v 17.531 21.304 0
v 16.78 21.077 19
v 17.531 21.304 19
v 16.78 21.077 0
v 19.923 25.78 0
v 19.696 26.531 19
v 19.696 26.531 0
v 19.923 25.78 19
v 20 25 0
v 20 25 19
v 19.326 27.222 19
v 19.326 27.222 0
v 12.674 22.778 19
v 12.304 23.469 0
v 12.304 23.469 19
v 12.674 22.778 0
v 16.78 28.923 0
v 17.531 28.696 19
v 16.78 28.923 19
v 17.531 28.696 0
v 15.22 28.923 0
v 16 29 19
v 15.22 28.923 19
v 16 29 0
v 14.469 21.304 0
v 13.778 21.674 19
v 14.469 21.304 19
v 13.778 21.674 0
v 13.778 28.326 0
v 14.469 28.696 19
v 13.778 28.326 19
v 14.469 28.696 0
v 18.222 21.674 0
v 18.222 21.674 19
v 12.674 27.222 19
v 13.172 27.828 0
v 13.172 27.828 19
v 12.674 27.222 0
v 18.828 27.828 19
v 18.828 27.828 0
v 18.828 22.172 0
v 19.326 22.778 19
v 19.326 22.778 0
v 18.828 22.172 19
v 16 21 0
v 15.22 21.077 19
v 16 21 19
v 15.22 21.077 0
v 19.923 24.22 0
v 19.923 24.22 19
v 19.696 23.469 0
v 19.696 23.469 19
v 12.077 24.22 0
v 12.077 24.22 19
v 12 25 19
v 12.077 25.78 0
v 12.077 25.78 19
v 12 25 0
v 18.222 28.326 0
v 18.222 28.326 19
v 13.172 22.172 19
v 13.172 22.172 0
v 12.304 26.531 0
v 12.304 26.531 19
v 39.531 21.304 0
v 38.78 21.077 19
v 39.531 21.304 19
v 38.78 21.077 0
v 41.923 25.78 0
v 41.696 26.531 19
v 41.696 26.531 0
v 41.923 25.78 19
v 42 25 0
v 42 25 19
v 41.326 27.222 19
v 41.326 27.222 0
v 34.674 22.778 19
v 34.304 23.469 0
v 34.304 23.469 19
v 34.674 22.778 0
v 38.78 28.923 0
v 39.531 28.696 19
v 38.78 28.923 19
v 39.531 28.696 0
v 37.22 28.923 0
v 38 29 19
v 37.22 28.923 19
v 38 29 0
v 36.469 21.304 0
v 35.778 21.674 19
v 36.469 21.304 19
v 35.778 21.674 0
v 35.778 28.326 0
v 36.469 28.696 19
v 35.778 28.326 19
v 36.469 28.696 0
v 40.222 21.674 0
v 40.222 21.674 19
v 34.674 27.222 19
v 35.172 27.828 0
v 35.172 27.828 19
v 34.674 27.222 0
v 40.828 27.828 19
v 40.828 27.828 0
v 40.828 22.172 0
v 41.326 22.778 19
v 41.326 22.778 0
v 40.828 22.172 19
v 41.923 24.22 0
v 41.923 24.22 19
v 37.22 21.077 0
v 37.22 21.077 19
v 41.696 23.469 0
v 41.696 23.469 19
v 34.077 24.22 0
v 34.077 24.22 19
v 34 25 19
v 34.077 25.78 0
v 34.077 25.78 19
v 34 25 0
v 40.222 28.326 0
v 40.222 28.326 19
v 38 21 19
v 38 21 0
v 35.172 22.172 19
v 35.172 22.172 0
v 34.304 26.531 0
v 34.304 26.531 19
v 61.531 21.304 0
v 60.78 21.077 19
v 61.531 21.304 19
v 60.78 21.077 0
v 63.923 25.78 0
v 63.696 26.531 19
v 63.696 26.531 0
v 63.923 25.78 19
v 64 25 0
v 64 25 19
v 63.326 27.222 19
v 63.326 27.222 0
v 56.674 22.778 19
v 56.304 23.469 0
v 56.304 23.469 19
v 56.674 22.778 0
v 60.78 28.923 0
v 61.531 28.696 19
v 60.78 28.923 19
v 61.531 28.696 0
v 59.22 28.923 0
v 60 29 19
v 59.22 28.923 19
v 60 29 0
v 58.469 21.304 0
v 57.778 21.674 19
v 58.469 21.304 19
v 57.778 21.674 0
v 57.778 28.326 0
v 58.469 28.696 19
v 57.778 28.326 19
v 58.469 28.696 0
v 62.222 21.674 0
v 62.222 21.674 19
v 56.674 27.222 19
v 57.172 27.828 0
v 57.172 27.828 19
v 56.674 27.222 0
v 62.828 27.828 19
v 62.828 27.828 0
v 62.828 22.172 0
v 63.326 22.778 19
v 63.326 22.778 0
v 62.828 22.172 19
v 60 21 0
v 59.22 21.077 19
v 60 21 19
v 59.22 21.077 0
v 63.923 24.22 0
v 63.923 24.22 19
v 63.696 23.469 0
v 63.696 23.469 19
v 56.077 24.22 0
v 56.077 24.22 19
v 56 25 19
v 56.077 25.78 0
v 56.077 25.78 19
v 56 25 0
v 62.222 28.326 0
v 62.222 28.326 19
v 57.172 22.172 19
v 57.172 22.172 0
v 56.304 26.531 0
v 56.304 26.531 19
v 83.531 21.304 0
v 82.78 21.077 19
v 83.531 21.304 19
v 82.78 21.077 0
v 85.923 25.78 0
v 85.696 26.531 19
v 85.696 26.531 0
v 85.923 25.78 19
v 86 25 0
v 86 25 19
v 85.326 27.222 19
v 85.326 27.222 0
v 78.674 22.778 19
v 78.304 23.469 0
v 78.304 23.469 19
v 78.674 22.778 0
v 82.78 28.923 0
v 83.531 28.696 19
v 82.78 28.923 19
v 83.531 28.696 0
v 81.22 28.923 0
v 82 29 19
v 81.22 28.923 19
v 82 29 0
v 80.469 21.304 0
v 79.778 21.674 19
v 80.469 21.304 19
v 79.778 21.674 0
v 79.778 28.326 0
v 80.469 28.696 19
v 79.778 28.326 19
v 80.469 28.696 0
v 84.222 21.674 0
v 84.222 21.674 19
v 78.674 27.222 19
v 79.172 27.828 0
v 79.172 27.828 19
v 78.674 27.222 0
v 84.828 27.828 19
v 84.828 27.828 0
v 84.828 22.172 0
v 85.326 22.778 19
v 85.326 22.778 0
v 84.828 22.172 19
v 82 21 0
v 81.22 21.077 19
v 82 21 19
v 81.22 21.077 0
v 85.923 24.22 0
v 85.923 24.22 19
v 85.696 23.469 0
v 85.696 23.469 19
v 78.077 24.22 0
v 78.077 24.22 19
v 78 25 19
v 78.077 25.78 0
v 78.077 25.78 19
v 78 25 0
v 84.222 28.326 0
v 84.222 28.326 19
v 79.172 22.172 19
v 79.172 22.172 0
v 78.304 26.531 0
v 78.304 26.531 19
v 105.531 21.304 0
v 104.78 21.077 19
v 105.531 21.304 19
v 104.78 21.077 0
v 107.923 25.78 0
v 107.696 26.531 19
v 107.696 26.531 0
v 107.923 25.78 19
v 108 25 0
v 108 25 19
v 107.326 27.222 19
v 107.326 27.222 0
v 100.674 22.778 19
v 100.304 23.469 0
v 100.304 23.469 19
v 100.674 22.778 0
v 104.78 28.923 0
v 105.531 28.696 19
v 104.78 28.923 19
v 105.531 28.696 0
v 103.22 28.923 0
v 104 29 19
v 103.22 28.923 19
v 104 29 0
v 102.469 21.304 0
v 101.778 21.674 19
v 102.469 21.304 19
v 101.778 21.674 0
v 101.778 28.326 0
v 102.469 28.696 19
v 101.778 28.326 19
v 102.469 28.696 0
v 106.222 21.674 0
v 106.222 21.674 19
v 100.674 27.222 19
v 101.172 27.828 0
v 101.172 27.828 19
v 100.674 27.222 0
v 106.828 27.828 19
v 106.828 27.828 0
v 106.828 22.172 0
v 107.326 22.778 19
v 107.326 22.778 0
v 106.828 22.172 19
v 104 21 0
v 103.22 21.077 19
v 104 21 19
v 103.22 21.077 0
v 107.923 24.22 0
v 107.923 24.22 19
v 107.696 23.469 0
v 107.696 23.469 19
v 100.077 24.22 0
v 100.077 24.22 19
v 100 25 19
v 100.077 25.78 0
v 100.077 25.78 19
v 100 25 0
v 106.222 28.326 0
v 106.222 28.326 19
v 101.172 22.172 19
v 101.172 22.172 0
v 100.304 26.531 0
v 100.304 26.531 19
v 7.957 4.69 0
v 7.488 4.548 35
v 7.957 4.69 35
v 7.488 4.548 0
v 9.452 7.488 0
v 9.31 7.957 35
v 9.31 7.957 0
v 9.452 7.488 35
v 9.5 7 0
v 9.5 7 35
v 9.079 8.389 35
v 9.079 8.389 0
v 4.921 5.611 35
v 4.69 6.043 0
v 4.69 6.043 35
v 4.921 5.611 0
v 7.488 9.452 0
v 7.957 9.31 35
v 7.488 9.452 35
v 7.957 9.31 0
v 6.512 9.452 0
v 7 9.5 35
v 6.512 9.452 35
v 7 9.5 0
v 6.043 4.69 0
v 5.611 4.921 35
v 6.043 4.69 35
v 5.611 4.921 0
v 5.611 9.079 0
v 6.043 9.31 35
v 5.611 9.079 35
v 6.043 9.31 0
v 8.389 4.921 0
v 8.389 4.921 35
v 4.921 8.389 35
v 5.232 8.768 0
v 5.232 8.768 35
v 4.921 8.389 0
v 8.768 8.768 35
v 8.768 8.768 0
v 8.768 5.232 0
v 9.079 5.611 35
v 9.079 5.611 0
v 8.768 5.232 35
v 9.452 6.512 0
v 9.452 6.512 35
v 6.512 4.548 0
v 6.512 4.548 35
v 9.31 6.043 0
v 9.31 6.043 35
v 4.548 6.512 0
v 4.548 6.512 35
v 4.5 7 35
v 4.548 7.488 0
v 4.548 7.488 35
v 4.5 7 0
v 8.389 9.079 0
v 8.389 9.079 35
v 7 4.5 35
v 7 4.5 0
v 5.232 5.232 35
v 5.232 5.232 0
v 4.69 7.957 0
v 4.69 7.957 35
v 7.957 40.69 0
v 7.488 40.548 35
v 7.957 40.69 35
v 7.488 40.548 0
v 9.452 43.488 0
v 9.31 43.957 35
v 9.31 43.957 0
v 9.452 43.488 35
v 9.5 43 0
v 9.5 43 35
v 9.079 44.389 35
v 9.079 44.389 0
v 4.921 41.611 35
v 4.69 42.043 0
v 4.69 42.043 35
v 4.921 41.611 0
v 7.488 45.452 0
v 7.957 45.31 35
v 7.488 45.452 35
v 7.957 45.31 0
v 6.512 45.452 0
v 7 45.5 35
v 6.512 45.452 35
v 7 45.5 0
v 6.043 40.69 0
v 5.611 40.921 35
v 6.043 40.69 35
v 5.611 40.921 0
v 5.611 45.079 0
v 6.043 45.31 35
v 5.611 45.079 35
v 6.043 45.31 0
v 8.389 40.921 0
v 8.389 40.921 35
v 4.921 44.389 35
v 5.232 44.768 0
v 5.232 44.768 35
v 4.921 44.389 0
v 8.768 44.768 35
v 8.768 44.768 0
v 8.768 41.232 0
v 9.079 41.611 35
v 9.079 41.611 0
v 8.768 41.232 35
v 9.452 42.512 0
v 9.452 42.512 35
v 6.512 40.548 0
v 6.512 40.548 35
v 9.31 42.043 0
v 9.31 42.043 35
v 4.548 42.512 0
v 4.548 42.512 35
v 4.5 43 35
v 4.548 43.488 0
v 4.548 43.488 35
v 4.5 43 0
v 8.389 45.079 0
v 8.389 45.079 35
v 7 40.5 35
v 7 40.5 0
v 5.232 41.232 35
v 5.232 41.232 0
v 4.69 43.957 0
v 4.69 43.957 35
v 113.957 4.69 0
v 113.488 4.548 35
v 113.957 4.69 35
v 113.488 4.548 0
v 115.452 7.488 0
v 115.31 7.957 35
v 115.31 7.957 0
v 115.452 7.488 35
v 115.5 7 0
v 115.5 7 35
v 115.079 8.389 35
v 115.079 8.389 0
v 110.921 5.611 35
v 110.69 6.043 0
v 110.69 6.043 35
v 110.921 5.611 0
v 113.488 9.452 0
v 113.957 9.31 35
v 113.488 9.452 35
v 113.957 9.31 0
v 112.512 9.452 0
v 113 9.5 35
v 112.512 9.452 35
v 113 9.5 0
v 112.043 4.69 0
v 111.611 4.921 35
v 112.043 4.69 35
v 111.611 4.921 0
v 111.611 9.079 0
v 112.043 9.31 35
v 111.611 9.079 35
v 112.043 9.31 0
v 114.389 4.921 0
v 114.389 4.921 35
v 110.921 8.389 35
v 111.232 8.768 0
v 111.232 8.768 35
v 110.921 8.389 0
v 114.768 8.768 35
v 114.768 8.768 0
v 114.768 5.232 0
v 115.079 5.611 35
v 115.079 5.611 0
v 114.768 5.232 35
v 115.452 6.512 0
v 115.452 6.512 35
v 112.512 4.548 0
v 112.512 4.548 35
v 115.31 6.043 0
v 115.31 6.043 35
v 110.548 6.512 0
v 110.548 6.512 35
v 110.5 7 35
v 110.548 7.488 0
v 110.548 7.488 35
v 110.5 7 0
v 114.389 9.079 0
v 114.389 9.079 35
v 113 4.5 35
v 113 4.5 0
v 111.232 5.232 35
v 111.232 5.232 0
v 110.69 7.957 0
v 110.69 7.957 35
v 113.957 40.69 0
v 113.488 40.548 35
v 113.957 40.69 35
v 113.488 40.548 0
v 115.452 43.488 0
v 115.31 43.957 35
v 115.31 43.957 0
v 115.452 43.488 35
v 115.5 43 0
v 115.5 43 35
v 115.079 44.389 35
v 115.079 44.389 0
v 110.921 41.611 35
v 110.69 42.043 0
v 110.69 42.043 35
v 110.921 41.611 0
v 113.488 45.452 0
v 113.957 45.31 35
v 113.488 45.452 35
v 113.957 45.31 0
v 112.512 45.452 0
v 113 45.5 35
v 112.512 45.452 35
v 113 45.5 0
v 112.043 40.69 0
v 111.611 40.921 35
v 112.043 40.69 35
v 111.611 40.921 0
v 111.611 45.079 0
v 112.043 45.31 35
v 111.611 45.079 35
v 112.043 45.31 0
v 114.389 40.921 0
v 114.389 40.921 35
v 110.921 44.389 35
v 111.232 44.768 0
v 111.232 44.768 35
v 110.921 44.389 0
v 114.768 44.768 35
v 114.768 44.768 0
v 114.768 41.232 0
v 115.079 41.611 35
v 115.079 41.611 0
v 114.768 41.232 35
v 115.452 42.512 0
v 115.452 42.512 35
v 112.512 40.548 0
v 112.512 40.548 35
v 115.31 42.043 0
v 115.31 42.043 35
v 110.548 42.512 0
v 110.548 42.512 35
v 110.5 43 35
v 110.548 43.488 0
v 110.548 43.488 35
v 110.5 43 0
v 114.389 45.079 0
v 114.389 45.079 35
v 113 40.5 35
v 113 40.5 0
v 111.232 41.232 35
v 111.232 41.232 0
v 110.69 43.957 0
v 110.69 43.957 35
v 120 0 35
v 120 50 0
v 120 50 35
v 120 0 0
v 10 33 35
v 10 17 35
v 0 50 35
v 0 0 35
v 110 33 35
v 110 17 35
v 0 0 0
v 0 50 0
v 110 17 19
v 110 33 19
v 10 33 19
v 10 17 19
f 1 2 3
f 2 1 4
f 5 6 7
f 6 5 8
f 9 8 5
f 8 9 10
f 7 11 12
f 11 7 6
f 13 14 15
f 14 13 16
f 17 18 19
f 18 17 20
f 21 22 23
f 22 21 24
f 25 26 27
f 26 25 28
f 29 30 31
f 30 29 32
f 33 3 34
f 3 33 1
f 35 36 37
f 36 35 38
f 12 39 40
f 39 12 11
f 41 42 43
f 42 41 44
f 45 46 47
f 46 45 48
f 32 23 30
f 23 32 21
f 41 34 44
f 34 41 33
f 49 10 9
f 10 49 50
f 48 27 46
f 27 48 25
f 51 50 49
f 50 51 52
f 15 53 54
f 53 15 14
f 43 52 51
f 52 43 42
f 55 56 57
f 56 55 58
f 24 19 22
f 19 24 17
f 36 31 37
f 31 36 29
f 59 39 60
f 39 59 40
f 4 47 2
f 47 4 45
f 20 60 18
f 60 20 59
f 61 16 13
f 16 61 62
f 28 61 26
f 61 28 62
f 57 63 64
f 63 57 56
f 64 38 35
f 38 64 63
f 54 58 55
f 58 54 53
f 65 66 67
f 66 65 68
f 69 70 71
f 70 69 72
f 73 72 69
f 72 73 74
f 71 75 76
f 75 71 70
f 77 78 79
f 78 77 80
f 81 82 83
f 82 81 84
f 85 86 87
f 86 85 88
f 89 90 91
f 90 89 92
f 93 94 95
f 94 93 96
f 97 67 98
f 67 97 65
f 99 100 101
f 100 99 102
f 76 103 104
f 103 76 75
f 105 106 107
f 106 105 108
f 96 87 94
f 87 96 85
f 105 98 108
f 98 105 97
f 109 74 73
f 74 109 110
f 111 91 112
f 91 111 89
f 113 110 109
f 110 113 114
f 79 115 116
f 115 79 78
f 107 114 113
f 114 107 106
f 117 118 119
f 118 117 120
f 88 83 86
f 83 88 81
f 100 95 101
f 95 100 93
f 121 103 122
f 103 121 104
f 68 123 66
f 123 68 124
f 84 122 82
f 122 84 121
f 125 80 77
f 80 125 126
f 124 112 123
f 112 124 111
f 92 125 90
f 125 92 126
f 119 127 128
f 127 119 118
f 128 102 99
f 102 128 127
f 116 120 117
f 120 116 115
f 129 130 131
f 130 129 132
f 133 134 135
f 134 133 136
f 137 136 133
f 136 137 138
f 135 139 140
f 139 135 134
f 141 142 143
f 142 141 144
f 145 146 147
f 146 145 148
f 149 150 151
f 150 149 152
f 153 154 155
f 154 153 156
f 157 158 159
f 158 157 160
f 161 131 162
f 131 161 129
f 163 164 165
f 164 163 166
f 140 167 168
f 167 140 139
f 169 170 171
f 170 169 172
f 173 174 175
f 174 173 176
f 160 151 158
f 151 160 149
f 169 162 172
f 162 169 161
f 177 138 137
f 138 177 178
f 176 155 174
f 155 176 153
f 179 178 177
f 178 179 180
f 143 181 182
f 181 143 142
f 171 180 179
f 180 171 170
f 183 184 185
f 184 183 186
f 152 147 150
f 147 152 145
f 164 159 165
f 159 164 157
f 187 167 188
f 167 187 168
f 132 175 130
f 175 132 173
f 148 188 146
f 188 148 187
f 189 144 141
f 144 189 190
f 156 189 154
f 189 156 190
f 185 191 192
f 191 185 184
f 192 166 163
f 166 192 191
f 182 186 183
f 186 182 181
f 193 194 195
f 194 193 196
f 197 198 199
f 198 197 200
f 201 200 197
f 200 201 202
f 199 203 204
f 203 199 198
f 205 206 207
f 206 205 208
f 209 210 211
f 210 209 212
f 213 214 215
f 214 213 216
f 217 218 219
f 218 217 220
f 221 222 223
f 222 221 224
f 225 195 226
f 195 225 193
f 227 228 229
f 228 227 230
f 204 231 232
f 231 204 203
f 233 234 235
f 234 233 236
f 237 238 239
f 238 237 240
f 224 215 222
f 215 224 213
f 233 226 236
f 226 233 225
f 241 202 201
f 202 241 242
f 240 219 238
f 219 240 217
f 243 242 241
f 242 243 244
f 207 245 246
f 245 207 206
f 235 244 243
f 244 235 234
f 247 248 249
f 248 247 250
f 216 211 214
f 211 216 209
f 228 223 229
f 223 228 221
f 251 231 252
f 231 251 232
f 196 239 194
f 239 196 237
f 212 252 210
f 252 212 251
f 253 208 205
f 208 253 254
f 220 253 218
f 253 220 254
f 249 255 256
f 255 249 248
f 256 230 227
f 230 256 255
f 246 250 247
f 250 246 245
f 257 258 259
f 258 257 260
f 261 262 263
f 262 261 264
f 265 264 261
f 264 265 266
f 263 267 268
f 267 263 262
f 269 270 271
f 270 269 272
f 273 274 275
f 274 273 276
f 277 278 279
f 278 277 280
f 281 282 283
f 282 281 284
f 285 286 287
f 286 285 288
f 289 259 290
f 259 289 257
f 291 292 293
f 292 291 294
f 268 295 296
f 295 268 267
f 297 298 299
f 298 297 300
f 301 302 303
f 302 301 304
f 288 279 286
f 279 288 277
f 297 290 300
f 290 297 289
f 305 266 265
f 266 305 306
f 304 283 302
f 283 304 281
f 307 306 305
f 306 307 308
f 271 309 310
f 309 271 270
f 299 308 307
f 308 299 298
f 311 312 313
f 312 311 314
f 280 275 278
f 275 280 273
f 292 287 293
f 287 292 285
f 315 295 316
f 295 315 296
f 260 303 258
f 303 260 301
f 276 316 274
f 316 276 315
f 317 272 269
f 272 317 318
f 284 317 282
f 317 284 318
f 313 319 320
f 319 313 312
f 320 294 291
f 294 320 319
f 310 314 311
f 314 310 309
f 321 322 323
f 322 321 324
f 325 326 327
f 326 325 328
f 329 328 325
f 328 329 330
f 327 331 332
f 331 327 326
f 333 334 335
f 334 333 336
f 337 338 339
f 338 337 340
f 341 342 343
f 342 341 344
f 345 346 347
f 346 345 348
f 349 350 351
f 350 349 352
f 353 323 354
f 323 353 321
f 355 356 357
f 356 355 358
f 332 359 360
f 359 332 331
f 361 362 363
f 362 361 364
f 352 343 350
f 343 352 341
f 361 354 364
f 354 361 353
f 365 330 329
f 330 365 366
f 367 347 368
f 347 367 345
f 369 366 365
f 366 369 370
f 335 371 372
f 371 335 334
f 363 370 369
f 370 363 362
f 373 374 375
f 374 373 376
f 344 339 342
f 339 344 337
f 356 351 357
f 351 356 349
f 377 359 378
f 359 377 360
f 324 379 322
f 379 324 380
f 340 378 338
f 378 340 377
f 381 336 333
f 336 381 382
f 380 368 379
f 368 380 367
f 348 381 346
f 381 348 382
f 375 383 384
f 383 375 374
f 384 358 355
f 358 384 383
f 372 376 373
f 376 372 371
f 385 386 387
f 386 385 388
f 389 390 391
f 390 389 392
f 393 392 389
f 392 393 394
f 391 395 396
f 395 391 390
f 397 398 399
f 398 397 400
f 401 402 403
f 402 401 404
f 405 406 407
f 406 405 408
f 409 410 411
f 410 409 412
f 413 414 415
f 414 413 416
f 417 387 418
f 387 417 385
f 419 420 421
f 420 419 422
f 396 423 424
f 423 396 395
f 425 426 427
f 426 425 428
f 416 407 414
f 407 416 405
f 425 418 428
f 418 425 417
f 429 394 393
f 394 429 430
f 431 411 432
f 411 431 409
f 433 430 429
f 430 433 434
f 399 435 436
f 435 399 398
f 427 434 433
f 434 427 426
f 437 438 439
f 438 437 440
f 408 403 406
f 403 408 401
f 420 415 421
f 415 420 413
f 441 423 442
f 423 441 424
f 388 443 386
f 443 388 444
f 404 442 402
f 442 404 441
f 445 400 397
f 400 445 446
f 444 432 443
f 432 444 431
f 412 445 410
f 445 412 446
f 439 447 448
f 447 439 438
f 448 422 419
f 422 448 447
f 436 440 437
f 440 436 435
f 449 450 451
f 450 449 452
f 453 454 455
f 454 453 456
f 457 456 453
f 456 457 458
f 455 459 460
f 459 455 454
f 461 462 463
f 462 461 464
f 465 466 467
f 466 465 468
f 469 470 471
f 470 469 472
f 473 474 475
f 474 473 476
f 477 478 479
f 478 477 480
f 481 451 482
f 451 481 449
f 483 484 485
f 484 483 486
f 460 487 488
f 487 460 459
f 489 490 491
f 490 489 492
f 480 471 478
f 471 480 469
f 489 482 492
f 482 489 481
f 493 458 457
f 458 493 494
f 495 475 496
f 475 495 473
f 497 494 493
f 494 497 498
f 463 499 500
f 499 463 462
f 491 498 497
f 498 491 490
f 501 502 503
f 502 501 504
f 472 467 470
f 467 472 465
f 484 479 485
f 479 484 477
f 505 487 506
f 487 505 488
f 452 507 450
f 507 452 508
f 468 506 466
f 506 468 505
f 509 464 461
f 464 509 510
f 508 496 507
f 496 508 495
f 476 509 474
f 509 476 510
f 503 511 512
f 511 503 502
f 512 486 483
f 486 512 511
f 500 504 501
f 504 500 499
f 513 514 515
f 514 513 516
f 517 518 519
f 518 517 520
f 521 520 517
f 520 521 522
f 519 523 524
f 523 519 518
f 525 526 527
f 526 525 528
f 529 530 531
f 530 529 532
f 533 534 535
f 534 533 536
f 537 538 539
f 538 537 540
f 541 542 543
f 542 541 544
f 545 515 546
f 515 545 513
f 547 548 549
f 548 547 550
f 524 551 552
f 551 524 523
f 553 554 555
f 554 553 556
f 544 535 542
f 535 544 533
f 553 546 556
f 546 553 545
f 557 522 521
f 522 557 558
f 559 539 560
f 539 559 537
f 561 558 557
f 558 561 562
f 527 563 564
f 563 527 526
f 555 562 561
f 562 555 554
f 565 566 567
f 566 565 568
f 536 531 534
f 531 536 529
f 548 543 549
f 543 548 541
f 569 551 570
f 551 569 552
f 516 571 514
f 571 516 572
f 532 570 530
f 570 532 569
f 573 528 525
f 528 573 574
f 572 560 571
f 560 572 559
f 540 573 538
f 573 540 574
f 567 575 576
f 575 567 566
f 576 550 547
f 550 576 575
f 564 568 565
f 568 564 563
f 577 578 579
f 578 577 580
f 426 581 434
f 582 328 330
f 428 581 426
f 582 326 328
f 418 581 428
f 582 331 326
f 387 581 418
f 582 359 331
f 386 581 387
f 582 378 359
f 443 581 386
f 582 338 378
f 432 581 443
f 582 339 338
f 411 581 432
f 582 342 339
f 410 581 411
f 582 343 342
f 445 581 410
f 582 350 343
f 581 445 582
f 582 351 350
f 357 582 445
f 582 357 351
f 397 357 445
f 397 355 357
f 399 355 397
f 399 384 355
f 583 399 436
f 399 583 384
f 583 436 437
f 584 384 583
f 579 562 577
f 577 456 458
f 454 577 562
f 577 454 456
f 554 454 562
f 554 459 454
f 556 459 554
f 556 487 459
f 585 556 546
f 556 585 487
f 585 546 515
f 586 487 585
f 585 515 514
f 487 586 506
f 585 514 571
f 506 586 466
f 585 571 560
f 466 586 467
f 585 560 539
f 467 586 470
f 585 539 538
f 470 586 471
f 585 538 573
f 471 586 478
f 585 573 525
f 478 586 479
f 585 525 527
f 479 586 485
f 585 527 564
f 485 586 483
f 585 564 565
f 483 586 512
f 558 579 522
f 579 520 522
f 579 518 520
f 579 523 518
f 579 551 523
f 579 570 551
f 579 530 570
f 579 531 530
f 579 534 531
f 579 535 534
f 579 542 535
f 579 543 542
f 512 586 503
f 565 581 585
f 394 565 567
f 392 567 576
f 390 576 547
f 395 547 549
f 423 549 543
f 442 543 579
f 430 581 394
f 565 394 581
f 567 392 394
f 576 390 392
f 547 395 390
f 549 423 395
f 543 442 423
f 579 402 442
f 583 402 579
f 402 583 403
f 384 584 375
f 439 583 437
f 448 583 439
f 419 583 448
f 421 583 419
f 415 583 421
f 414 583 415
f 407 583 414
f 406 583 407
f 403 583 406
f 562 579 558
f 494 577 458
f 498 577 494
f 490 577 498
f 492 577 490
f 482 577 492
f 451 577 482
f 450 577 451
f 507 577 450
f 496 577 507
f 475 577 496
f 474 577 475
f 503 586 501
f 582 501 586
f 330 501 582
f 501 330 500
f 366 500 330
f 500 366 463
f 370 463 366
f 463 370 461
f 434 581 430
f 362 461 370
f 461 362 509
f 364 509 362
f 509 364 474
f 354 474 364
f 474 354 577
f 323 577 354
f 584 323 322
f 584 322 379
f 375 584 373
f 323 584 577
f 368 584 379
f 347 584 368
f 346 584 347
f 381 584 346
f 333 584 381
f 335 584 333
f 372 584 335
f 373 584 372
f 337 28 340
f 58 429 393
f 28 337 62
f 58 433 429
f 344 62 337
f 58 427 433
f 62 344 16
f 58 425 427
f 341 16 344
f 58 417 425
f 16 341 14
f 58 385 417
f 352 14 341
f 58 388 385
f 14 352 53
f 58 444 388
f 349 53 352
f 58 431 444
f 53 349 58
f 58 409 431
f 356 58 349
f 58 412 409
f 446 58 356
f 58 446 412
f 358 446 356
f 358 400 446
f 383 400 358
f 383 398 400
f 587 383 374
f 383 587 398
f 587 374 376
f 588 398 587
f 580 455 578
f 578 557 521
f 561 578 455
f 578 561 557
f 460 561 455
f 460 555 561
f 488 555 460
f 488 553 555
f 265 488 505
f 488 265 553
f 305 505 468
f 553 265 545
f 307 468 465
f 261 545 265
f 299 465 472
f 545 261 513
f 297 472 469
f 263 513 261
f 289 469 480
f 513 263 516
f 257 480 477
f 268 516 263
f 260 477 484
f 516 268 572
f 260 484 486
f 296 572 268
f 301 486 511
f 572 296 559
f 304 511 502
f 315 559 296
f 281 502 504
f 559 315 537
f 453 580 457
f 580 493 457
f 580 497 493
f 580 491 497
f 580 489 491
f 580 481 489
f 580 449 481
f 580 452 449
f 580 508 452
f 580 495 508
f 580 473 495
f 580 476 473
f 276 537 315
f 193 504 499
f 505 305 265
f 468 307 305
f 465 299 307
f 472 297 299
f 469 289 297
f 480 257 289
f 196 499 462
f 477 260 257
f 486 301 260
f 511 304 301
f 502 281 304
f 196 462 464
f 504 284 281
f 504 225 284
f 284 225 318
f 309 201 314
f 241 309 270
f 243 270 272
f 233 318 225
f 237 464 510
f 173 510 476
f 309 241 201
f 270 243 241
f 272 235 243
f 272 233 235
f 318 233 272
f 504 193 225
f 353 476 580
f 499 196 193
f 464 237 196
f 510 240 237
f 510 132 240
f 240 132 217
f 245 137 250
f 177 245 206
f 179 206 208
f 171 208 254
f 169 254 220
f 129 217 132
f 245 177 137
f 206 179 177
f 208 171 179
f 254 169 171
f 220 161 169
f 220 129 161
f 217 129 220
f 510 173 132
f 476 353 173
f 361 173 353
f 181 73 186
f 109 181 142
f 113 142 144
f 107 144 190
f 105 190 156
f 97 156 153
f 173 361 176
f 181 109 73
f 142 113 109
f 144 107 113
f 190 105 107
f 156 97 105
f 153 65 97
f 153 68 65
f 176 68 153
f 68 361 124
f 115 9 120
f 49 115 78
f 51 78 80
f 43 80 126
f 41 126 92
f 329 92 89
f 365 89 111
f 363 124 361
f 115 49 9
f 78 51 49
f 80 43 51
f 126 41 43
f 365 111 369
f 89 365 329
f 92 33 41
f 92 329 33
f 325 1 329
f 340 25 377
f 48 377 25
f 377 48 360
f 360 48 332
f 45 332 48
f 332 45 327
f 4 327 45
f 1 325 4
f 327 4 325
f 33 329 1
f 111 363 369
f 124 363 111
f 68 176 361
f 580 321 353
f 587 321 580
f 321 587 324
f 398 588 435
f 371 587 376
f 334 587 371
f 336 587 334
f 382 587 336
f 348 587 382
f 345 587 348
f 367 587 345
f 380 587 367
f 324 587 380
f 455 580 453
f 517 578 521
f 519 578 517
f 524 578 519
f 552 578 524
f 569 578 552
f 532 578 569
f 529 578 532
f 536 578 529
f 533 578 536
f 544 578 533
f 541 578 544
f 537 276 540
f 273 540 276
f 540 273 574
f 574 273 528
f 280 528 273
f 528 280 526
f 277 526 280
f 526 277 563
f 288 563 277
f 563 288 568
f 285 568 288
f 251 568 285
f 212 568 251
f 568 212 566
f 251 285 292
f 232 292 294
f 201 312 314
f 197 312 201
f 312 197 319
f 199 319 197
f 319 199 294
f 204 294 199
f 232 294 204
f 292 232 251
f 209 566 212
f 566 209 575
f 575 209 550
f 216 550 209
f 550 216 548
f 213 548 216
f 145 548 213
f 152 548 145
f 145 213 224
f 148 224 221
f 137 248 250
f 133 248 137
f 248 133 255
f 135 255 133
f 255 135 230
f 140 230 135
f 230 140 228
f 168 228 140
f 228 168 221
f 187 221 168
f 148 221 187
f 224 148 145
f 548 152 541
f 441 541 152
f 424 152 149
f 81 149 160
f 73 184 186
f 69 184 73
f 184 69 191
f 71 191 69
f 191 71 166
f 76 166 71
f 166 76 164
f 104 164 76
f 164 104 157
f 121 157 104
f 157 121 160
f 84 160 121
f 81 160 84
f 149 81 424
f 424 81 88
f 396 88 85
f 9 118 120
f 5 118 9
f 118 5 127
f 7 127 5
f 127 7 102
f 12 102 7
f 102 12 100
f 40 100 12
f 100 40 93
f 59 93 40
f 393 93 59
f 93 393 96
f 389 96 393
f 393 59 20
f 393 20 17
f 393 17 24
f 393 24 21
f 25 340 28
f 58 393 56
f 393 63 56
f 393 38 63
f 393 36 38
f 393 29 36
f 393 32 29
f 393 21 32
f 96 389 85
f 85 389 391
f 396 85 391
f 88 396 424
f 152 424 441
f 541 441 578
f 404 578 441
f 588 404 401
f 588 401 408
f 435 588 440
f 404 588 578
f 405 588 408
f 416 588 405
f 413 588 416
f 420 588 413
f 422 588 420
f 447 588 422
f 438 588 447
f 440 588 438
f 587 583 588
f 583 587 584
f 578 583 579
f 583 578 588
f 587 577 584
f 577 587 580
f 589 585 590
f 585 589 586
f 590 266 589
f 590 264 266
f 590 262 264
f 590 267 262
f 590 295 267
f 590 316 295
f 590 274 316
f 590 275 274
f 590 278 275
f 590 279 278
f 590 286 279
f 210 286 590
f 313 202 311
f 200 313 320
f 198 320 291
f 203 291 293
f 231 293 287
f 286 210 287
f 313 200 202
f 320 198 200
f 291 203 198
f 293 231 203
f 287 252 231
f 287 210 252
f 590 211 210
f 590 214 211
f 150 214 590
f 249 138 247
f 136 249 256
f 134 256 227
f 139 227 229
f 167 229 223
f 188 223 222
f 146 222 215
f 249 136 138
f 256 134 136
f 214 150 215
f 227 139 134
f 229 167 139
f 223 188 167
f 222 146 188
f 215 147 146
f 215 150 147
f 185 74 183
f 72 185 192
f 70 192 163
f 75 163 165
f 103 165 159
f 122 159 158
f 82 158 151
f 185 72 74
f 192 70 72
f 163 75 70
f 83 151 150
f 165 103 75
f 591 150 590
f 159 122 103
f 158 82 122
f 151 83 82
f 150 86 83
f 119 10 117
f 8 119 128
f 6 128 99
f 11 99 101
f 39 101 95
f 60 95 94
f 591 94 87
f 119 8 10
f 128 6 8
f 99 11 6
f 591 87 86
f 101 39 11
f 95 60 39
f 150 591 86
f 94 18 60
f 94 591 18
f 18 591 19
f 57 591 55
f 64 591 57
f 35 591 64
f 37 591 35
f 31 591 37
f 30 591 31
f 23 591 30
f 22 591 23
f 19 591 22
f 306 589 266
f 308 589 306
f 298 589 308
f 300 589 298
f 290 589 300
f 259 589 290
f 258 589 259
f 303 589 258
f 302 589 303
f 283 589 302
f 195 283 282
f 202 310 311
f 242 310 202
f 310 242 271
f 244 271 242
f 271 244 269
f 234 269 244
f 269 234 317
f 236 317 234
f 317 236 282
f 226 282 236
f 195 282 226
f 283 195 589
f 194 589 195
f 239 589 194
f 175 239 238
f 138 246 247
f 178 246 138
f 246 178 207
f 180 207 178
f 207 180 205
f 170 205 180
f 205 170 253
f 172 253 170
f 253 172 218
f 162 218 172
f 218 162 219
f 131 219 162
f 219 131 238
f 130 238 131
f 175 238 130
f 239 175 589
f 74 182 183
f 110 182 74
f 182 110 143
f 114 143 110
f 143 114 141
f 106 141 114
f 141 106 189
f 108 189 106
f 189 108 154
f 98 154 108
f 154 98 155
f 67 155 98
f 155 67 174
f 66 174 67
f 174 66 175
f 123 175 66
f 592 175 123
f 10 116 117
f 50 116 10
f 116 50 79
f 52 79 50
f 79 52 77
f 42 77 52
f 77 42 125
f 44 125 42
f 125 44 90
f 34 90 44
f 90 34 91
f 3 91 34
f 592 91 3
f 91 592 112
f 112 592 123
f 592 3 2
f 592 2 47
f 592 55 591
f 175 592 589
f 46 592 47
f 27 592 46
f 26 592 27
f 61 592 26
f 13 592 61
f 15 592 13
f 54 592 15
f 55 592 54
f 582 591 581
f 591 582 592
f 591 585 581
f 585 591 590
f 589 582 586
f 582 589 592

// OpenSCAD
$fn = 32;

// ----------------------------------------------------------------------
// Manifold block: gallery_top manifold
// ----------------------------------------------------------------------

// --- parameters (mm) ---
block_l = 120;            // block length, X
block_w = 50;             // block width, Y
block_h = 35;             // block height, Z
port_d = 8;               // port bore diameter
port_pitch = 22;          // port pitch along X
gallery_d = 16;           // top gallery width, Y
gallery_depth = 16;       // gallery pocket depth
wall_p = 10;              // gallery end wall thickness, X
mnt_d = 5;                // mounting hole diameter
mnt_in = 7;               // mounting hole inset from the edges

n_ports = 5;  // ports in the row
port_x0 = (block_l - (n_ports - 1) * port_pitch) / 2;  // first port X

difference() {
  cube([block_l, block_w, block_h]);
  for (i = [0 : n_ports - 1])
    translate([port_x0 + i * port_pitch, block_w / 2, -1])
      cylinder(h = block_h + 2, d = port_d);
  translate([wall_p, block_w / 2 - gallery_d / 2, block_h - gallery_depth])
    cube([block_l - 2 * wall_p, gallery_d, gallery_depth + 1]);
  for (cx = [mnt_in, block_l - mnt_in])
    for (cy = [mnt_in, block_w - mnt_in])
      translate([cx, cy, -1]) cylinder(h = block_h + 2, d = mnt_d);
}
